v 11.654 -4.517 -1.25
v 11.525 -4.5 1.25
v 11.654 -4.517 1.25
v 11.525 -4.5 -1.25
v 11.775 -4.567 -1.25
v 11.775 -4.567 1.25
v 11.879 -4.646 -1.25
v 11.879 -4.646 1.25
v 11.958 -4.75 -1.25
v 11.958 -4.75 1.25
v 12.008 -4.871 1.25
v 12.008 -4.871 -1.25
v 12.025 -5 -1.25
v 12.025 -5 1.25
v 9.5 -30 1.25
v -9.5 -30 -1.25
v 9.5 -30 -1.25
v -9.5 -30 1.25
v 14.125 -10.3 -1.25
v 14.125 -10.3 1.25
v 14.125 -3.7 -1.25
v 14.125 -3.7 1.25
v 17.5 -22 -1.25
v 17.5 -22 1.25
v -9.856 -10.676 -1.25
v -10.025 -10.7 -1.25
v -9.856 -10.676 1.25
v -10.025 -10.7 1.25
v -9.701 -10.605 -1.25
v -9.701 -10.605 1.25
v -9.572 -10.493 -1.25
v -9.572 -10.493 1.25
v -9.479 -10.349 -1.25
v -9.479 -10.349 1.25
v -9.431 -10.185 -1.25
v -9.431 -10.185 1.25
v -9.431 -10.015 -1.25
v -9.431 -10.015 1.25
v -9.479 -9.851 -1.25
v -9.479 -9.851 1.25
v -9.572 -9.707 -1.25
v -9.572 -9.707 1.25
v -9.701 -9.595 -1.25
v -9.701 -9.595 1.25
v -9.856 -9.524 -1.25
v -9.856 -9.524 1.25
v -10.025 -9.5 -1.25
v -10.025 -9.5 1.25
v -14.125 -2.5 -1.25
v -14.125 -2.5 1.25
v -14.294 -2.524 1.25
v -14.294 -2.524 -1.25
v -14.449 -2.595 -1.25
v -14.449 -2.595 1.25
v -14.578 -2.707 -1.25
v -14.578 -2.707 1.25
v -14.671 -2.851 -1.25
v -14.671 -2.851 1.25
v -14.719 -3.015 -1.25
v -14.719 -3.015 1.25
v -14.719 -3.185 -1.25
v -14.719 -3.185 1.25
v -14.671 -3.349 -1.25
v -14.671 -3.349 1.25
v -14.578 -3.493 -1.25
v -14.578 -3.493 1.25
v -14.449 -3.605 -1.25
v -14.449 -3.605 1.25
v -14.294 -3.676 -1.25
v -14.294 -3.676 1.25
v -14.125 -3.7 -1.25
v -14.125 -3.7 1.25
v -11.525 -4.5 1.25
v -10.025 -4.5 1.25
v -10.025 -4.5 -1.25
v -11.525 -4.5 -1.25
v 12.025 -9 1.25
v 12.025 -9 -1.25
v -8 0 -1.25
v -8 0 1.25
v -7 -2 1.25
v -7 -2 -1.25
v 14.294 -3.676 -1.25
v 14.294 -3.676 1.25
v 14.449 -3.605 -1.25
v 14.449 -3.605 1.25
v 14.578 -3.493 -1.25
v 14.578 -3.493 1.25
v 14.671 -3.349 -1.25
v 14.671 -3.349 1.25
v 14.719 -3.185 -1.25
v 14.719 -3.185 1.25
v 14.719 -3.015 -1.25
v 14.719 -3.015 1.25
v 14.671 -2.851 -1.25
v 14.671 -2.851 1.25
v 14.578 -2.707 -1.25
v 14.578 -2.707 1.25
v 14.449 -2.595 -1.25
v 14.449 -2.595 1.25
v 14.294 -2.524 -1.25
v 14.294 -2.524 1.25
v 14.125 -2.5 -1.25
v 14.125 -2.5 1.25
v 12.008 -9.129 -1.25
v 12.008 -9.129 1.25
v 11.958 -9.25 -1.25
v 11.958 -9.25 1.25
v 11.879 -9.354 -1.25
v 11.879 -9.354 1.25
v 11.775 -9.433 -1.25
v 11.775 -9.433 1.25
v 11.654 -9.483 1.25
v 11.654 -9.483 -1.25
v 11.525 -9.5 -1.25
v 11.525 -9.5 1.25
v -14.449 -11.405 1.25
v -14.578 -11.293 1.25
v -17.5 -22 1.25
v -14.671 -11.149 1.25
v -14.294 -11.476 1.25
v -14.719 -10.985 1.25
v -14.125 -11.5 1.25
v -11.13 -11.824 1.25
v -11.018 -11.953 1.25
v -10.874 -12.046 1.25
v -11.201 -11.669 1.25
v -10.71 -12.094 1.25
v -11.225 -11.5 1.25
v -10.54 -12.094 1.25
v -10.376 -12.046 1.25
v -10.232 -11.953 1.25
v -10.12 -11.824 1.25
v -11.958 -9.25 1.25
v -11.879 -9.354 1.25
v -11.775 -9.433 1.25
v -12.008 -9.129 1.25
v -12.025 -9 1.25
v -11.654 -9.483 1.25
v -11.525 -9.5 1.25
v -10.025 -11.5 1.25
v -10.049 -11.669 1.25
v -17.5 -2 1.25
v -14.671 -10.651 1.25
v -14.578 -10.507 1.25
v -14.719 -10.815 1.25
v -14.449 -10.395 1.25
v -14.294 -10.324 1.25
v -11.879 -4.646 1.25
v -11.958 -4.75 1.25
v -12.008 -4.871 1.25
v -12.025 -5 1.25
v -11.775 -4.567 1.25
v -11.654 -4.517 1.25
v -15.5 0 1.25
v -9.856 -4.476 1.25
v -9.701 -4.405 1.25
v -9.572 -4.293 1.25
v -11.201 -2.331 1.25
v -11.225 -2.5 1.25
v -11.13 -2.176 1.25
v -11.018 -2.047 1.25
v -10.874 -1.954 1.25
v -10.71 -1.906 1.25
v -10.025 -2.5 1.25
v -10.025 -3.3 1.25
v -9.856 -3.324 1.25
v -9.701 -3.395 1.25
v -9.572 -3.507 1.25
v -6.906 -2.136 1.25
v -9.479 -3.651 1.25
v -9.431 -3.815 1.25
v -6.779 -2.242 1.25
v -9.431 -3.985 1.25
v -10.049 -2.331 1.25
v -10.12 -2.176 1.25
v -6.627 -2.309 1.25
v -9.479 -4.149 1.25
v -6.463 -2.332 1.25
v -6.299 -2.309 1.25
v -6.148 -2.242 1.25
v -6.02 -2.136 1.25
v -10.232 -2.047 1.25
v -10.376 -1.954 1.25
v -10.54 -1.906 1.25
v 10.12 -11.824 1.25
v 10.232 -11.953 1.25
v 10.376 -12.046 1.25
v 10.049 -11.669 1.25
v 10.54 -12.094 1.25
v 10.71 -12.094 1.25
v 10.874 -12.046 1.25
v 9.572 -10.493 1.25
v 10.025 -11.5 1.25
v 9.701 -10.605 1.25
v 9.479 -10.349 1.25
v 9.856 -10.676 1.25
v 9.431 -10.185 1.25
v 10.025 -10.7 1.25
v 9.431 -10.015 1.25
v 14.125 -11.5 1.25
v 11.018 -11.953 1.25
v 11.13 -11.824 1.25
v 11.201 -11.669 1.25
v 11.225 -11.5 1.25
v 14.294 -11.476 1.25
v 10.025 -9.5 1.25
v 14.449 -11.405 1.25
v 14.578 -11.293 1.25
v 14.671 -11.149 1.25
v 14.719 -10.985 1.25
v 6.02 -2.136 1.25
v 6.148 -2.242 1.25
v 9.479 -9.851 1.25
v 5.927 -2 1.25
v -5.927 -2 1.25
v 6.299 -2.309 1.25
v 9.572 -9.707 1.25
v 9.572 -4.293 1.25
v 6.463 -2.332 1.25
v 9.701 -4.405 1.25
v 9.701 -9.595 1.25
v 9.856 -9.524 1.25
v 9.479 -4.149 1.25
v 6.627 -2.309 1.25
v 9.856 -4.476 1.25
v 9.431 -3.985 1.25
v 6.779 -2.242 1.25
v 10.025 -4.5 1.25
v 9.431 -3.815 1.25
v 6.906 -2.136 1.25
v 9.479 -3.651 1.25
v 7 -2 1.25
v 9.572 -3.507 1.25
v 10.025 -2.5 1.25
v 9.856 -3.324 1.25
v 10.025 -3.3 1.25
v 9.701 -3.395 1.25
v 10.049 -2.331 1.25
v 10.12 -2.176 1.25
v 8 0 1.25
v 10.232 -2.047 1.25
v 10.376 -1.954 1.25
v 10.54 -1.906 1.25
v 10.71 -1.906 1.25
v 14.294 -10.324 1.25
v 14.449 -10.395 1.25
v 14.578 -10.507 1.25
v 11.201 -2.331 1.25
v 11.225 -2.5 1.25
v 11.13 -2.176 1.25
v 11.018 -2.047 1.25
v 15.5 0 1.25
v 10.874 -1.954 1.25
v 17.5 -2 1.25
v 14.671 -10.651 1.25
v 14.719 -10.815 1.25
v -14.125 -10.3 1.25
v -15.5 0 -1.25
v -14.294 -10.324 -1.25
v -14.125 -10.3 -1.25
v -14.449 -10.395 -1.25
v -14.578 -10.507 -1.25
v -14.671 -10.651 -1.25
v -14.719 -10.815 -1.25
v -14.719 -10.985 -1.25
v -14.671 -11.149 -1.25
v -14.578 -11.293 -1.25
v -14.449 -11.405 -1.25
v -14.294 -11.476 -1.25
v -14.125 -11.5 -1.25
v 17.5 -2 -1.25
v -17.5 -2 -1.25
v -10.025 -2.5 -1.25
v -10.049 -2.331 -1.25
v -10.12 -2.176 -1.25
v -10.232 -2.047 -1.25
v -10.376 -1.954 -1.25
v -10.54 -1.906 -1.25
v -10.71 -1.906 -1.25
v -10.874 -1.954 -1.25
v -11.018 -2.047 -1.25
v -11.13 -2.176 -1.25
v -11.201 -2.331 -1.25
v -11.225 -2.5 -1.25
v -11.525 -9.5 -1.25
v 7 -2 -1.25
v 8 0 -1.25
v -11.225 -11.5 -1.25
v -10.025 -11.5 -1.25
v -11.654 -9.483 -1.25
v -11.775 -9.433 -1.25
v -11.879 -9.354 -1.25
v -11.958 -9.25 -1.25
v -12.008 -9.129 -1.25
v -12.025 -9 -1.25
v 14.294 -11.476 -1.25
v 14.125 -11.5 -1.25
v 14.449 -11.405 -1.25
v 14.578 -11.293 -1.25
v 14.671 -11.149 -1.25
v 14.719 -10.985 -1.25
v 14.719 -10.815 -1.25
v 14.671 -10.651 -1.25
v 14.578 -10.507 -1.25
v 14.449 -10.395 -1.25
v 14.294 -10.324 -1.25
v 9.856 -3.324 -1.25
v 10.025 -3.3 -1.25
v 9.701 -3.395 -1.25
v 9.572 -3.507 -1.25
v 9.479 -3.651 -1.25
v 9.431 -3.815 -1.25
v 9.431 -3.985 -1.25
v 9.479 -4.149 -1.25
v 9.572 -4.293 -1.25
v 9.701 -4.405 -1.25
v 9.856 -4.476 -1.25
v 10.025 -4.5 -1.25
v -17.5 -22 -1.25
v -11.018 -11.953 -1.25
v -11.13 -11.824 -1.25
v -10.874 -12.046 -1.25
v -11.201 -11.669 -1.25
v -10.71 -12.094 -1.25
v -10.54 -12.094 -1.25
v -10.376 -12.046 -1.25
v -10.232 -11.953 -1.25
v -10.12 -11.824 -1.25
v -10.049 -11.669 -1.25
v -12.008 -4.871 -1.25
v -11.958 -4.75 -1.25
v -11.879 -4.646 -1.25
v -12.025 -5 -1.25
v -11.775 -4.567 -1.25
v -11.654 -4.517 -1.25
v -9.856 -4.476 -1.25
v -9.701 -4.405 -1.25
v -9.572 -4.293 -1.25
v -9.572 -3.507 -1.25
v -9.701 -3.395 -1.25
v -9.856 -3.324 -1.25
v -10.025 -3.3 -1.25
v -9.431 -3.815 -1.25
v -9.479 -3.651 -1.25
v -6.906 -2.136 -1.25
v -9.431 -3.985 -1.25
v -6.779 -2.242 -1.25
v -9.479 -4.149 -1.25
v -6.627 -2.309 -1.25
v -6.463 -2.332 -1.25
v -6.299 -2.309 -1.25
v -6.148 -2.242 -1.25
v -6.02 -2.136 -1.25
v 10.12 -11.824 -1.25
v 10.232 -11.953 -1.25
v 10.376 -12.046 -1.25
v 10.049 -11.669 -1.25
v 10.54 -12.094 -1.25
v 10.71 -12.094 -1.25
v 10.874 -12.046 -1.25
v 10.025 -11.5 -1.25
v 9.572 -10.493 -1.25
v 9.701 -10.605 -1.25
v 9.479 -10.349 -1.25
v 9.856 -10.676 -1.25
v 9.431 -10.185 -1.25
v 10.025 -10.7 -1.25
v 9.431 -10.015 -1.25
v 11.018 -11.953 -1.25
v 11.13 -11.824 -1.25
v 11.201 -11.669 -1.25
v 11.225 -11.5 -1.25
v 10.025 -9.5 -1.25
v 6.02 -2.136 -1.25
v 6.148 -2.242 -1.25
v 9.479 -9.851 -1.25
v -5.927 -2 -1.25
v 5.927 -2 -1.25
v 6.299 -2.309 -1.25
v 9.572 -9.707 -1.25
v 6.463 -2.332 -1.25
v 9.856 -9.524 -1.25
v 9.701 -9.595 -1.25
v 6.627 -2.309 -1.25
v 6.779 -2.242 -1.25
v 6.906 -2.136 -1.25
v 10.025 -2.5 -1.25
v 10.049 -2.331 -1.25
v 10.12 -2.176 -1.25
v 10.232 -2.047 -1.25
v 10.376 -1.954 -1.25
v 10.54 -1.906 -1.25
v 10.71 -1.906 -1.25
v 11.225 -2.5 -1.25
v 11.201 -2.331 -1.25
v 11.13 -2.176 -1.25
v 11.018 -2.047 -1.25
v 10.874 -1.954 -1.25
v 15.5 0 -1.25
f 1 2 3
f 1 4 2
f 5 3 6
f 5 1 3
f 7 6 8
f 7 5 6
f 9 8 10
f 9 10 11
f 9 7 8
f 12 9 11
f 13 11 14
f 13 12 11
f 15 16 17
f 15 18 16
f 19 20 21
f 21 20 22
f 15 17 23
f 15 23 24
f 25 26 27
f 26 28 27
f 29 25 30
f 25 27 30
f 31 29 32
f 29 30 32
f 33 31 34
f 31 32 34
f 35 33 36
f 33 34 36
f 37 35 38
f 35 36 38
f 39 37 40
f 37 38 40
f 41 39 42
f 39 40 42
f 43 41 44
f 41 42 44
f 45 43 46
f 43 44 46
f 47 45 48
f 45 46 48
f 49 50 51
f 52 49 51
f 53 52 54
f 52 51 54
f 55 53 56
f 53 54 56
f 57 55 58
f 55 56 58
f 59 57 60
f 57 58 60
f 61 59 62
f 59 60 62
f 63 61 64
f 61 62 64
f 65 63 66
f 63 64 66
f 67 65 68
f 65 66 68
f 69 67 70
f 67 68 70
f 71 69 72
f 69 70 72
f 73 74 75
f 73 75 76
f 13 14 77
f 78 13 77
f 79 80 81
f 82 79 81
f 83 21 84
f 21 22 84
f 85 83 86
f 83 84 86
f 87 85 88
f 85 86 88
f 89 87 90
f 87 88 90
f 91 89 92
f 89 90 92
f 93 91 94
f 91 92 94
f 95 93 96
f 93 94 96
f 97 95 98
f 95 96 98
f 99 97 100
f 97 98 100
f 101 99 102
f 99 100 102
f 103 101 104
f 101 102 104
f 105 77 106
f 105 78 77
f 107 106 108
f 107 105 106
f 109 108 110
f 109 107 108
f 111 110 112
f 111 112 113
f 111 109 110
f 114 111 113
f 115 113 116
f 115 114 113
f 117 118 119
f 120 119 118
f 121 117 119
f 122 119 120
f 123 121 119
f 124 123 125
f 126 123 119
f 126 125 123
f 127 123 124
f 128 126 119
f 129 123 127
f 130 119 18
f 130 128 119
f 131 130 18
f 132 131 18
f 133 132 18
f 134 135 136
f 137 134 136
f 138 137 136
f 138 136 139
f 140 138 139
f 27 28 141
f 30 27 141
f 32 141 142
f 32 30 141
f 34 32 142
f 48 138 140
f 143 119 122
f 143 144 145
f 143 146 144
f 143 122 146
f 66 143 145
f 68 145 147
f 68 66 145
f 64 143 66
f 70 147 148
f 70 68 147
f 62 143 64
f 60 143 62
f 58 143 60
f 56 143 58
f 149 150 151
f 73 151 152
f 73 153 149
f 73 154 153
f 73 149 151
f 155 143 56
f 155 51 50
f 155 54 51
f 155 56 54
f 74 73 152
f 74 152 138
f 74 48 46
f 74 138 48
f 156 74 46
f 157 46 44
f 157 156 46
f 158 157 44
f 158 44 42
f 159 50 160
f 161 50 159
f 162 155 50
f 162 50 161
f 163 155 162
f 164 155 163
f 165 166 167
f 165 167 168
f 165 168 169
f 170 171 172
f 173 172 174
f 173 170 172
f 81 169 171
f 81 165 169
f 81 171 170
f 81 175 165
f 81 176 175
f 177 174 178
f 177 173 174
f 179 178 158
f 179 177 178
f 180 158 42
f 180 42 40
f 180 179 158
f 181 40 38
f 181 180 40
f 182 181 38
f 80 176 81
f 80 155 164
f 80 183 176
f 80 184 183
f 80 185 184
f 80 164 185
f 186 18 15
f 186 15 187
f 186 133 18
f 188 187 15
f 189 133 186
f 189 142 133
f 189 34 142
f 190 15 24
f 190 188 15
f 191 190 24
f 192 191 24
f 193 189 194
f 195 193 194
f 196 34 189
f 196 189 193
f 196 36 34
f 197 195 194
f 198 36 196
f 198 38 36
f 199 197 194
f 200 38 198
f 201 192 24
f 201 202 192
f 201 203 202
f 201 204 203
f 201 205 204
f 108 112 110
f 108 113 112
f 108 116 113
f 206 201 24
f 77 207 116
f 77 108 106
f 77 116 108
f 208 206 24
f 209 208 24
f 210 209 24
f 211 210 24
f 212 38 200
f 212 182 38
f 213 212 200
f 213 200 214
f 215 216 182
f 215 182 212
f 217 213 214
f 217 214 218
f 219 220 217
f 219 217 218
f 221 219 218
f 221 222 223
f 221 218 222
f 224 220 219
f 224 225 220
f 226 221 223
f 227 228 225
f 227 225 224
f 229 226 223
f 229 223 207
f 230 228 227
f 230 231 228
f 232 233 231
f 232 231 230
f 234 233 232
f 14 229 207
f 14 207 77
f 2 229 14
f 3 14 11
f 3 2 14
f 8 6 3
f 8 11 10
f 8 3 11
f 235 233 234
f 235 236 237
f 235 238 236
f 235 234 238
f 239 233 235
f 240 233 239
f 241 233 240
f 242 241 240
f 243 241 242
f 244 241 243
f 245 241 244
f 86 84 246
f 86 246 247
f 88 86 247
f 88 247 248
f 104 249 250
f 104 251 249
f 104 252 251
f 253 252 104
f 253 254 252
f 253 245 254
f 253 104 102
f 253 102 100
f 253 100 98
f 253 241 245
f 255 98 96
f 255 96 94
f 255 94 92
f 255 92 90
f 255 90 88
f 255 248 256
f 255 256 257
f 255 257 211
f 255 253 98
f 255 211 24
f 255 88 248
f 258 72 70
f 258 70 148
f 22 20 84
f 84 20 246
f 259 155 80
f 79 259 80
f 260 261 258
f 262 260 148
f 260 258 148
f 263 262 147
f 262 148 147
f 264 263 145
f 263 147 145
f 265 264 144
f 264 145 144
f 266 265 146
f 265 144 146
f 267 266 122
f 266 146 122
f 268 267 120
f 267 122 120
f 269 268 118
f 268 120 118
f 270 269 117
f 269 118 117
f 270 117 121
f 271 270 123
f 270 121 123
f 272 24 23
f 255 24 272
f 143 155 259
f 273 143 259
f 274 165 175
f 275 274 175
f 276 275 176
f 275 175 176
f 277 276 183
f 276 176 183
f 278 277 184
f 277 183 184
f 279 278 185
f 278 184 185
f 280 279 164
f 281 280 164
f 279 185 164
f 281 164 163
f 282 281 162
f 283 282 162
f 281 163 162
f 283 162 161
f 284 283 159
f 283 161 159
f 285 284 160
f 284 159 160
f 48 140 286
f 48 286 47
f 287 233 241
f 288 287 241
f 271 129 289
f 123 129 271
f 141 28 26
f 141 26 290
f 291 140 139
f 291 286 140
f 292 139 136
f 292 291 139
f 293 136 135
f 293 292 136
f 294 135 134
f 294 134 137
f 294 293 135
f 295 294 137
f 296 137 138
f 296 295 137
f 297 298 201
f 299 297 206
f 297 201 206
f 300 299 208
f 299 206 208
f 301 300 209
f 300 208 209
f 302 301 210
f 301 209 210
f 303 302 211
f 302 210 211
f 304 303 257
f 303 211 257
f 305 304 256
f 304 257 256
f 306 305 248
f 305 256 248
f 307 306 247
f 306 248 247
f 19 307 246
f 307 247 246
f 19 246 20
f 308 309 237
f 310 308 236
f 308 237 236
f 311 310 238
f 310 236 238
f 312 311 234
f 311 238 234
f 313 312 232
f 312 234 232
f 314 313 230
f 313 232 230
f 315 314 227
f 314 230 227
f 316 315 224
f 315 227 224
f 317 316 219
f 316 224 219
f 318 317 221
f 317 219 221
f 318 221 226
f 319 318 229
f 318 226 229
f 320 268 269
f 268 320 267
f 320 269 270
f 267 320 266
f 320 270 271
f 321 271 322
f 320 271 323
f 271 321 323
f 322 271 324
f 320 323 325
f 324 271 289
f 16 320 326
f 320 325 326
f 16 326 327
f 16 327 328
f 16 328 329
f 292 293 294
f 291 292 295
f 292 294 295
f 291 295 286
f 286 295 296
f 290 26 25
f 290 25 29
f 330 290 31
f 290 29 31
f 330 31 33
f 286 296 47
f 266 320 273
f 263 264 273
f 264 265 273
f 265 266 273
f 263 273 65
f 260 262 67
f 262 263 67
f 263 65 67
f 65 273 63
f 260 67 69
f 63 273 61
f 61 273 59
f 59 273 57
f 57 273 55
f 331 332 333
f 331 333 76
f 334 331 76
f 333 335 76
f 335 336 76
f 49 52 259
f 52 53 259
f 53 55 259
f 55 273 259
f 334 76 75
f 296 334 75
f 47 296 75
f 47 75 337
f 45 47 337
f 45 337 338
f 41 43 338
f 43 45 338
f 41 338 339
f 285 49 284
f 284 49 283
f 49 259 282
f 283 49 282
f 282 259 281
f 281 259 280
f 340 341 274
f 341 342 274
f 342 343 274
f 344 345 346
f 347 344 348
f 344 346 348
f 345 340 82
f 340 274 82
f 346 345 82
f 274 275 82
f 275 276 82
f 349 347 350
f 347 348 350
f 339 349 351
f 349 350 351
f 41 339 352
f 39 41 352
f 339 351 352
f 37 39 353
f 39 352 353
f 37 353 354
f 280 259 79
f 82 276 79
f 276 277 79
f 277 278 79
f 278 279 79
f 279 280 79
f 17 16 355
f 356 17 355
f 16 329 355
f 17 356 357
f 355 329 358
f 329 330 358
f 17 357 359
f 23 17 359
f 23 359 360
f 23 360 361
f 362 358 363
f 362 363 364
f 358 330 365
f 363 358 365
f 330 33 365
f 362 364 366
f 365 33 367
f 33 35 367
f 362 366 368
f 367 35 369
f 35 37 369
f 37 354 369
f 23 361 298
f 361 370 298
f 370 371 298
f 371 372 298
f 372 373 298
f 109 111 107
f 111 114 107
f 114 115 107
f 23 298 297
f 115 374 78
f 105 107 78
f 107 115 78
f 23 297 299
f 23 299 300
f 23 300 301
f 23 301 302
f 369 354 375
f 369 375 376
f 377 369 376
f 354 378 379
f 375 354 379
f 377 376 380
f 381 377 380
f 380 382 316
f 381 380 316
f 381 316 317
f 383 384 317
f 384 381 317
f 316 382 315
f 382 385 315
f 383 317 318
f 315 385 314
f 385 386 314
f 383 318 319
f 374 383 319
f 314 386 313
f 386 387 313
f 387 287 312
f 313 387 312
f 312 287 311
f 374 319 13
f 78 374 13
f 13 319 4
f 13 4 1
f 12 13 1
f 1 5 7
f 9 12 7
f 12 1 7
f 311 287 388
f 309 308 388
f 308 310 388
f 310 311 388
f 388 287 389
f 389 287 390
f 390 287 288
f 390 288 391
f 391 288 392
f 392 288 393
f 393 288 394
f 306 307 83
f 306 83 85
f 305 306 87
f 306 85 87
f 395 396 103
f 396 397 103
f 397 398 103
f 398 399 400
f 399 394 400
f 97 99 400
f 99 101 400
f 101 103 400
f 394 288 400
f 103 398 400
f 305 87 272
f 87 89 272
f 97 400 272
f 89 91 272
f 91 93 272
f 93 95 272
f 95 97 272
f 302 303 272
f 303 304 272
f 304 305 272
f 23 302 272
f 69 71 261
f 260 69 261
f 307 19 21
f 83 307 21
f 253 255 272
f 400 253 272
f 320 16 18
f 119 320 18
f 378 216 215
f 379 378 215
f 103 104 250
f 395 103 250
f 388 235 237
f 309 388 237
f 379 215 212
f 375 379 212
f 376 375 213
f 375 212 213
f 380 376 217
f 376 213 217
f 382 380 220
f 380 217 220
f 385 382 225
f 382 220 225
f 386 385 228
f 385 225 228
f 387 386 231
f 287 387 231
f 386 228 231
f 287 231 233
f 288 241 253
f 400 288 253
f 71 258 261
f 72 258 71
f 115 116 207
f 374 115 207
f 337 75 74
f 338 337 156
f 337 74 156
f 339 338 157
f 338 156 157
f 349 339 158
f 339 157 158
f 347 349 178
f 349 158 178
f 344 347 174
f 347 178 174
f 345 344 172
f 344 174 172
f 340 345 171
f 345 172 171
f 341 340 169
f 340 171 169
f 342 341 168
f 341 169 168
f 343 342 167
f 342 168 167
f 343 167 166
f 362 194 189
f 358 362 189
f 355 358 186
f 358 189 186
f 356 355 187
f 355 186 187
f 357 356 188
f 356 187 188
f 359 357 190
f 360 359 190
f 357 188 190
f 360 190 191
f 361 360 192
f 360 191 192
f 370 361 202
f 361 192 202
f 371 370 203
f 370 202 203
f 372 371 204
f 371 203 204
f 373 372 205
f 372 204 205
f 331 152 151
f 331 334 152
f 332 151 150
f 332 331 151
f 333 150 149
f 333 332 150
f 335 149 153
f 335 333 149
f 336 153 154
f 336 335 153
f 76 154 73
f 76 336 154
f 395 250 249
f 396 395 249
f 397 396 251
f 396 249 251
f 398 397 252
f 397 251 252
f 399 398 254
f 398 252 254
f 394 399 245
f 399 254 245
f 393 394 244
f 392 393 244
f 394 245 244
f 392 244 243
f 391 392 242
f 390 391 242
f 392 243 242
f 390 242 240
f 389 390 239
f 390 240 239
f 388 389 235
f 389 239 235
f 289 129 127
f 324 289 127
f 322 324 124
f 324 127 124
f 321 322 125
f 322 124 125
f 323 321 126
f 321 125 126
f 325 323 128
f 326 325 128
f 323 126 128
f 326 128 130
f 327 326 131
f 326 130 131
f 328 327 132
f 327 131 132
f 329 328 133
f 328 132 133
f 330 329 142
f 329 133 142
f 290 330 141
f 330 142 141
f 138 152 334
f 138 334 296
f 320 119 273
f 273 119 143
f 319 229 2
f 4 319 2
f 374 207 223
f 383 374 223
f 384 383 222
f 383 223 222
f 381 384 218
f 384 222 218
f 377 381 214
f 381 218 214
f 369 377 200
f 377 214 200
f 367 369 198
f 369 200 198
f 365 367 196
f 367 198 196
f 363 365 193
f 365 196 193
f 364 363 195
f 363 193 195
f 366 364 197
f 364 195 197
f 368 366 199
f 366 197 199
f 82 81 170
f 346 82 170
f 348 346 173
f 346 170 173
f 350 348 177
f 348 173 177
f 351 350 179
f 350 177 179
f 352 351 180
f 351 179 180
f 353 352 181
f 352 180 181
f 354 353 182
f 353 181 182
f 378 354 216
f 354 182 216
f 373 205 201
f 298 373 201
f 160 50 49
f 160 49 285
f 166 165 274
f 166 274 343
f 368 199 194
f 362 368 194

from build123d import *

# Parameters (mm, degrees)
SKETCH_1_W          = 35
SKETCH_1_H          = 30
EXTRUDE_1_DEPTH     = 1.25
CHAMFER_1_SIZE      = 8
CHAMFER_2_SIZE      = 2
CUT_EXTRUDE_1_DEPTH = 3.5
CUT_EXTRUDE_2_DEPTH = 3.5
SKETCH_5_R          = 0.6
CUT_EXTRUDE_3_DEPTH = 3.5
FILLET_1_R          = 0.5


with BuildPart() as part:
    # 草图1 → 凸台-拉伸1 (new body, symmetric)
    with BuildSketch(Plane.XY):
        with Locations((0, -15)):
            Rectangle(SKETCH_1_W, SKETCH_1_H)
    extrude(amount=EXTRUDE_1_DEPTH, both=True)

    # 倒角1
    chamfer_1_edges = [part.edges().sort_by_distance(p)[0] for p in [
        (17.5, -30, 0),
        (-17.5, -30, 0),
    ]]
    chamfer(chamfer_1_edges, length=CHAMFER_1_SIZE)

    # 倒角2
    chamfer_2_edges = [part.edges().sort_by_distance(p)[0] for p in [
        (-17.5, 0, 0),
        (17.5, 0, 0),
    ]]
    chamfer(chamfer_2_edges, length=CHAMFER_2_SIZE)

    # 草图2 → 切除-拉伸1 (cut, through all)
    with BuildSketch(Plane.XY.offset(1.25)):
        Polygon((-8, 0), (-7, -2), (7, -2), (8, 0), align=None)
    extrude(amount=-CUT_EXTRUDE_1_DEPTH, mode=Mode.SUBTRACT)

    # 草图4 → 切除-拉伸2 (cut, through all)
    with BuildSketch(Plane.XY.offset(1.25)):
        Polygon((-14.125, -2.5), (-10.025, -2.5), (-10.025, -4.5), (-12.025, -4.5), (-12.025, -9.5), (-10.025, -9.5), (-10.025, -11.5), (-14.125, -11.5), align=None)
        Polygon((10.025, -11.5), (14.125, -11.5), (14.125, -2.5), (10.025, -2.5), (10.025, -4.5), (12.025, -4.5), (12.025, -9.5), (10.025, -9.5), align=None)
    extrude(amount=-CUT_EXTRUDE_2_DEPTH, mode=Mode.SUBTRACT)

    # 草图5 → 切除-拉伸3 (cut, through all)
    with BuildSketch(Plane.XY.offset(1.25)):
        with Locations((-14.125, -3.1)):
            Circle(SKETCH_5_R)
        with Locations((-14.125, -10.9)):
            Circle(SKETCH_5_R)
        with Locations((-10.625, -11.5)):
            Circle(SKETCH_5_R)
        with Locations((-10.025, -10.1)):
            Circle(SKETCH_5_R)
        with Locations((-10.025, -3.9)):
            Circle(SKETCH_5_R)
        with Locations((-10.625, -2.5)):
            Circle(SKETCH_5_R)
        with Locations((10.625, -2.5)):
            Circle(SKETCH_5_R)
        with Locations((10.025, -3.9)):
            Circle(SKETCH_5_R)
        with Locations((10.025, -10.1)):
            Circle(SKETCH_5_R)
        with Locations((10.625, -11.5)):
            Circle(SKETCH_5_R)
        with Locations((14.125, -10.9)):
            Circle(SKETCH_5_R)
        with Locations((14.125, -3.1)):
            Circle(SKETCH_5_R)
        with Locations((-6.463343685, -1.731671843)):
            Circle(SKETCH_5_R)
        with Locations((6.463343685, -1.731671843)):
            Circle(SKETCH_5_R)
    extrude(amount=-CUT_EXTRUDE_3_DEPTH, mode=Mode.SUBTRACT)

    # 圆角1
    fillet_1_edges = [part.edges().sort_by_distance(p)[0] for p in [
        (-12.025, -4.5, 0),
        (-12.025, -9.5, 0),
        (12.025, -9.5, 0),
        (12.025, -4.5, 0),
    ]]
    fillet(fillet_1_edges, radius=FILLET_1_R)


solid = part.part
